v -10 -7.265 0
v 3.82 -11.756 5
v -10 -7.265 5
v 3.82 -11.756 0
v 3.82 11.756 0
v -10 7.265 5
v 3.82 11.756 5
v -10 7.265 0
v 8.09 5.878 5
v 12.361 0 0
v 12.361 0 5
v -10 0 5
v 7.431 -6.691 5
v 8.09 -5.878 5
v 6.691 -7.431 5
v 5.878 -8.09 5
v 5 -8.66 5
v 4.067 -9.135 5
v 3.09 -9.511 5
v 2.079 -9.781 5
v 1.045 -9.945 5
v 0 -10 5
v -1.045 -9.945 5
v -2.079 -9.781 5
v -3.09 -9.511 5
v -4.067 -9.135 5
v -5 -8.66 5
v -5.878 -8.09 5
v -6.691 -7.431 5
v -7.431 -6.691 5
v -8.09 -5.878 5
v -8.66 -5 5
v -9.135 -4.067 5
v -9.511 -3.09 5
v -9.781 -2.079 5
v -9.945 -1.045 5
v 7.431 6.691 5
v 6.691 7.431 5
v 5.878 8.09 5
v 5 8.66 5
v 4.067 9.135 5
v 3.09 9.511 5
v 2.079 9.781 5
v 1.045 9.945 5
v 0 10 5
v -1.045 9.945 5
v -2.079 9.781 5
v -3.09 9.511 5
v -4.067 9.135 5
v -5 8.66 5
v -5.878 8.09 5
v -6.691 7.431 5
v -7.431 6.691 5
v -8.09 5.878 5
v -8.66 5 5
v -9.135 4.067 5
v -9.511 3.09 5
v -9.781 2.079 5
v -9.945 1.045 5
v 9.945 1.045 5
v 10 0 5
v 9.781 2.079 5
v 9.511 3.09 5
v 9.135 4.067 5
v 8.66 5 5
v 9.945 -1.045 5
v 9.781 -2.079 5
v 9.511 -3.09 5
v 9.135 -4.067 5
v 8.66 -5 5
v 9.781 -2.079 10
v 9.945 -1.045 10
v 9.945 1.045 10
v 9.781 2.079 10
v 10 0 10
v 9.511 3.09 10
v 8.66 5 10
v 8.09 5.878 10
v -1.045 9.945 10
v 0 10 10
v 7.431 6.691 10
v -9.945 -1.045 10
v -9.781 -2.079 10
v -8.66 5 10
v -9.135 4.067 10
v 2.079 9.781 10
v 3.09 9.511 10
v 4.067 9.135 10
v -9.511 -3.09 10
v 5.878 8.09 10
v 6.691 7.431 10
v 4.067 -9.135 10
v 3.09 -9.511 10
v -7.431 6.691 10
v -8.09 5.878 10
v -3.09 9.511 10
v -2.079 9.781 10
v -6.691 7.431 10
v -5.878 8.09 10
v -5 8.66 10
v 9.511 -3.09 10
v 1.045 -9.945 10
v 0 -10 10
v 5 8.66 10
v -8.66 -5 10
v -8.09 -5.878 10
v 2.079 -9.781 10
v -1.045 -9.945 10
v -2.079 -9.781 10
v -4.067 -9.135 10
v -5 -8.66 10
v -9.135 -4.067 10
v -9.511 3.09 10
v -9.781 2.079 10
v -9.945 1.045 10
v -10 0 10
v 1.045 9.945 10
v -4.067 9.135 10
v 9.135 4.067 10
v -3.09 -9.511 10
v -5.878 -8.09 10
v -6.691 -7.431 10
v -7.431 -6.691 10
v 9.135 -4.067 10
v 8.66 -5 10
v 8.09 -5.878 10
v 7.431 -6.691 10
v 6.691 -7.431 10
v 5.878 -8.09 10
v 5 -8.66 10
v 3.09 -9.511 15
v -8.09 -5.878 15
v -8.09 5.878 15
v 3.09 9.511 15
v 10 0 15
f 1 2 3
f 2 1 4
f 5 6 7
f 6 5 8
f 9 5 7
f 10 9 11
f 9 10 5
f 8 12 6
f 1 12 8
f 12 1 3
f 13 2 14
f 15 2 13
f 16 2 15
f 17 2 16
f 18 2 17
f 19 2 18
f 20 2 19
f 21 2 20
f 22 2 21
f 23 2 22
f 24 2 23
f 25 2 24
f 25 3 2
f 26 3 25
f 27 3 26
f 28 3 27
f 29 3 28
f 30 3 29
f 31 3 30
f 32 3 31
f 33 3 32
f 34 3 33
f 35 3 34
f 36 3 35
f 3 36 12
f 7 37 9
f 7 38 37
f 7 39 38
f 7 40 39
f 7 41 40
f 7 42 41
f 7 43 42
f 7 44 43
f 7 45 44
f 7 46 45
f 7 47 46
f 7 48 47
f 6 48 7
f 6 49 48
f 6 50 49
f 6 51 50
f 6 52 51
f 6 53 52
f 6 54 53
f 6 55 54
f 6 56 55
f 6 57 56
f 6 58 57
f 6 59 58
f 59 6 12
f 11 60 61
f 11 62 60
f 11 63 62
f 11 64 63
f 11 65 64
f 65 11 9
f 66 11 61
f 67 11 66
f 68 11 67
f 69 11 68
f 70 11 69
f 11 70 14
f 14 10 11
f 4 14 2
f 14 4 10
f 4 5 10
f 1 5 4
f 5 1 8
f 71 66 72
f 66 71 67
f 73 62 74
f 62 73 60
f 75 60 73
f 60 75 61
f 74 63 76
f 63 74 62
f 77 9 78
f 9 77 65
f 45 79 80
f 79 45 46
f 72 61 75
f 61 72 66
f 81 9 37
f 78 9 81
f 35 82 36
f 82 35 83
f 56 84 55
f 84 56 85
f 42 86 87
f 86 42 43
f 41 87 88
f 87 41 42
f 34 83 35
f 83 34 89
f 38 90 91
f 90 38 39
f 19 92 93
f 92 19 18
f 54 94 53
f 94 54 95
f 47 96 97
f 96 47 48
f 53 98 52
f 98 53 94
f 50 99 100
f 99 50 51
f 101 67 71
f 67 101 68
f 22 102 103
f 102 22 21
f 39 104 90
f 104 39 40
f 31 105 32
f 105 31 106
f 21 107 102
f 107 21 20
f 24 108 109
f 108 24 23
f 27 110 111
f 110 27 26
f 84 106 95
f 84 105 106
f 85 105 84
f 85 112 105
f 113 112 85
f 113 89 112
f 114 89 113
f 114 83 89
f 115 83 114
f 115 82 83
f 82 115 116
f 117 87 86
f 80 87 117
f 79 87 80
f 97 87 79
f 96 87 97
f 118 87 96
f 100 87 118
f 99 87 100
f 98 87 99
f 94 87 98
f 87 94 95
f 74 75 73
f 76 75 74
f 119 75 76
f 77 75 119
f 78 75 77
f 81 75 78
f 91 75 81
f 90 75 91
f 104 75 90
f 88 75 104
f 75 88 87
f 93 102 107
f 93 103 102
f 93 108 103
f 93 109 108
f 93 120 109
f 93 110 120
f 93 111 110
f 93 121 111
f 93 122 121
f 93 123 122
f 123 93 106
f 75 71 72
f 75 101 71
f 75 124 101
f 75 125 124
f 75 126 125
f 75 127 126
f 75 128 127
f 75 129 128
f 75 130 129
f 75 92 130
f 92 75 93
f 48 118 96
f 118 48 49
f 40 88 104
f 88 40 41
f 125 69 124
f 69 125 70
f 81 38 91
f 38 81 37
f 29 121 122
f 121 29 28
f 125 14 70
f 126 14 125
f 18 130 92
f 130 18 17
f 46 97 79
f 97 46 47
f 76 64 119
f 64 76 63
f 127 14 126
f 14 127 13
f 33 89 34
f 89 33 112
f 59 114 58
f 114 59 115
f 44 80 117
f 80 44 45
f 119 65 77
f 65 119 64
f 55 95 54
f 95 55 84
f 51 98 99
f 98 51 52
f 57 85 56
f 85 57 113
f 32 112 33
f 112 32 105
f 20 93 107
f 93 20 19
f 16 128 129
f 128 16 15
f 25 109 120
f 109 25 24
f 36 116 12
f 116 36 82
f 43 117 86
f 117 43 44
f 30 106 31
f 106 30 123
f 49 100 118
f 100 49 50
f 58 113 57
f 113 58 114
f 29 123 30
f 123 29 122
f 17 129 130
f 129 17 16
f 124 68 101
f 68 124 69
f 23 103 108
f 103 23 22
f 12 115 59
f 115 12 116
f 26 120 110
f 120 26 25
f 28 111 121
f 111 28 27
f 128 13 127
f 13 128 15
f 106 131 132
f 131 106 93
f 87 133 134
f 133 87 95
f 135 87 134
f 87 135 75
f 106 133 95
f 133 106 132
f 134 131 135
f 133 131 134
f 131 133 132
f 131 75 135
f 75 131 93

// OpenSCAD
/*
Trying out the customizer with a minimal script that
generates a stack of polygons with a circle in the middle.
The top and bottom polygons are the circumscribed and
inscribed respectively. Uses a single parameter (number
of sides) as shown here: 

http://customizer.makerbot.com/docs

// variable description
variable name = default value; // possible values

*/

// Number of Sides
N=5; // [3,4,5,6,7,8,9,10,11,12,13]

color("RoyalBlue") cylinder(r=10/cos(180/N), h=5, $fn=N);
color("DeepSkyBlue") translate([0,0,5]) cylinder(r=10, h=5, $fn=12*N);
color("Aqua") translate([0,0,10]) cylinder(r=10, h=5, $fn=N);
